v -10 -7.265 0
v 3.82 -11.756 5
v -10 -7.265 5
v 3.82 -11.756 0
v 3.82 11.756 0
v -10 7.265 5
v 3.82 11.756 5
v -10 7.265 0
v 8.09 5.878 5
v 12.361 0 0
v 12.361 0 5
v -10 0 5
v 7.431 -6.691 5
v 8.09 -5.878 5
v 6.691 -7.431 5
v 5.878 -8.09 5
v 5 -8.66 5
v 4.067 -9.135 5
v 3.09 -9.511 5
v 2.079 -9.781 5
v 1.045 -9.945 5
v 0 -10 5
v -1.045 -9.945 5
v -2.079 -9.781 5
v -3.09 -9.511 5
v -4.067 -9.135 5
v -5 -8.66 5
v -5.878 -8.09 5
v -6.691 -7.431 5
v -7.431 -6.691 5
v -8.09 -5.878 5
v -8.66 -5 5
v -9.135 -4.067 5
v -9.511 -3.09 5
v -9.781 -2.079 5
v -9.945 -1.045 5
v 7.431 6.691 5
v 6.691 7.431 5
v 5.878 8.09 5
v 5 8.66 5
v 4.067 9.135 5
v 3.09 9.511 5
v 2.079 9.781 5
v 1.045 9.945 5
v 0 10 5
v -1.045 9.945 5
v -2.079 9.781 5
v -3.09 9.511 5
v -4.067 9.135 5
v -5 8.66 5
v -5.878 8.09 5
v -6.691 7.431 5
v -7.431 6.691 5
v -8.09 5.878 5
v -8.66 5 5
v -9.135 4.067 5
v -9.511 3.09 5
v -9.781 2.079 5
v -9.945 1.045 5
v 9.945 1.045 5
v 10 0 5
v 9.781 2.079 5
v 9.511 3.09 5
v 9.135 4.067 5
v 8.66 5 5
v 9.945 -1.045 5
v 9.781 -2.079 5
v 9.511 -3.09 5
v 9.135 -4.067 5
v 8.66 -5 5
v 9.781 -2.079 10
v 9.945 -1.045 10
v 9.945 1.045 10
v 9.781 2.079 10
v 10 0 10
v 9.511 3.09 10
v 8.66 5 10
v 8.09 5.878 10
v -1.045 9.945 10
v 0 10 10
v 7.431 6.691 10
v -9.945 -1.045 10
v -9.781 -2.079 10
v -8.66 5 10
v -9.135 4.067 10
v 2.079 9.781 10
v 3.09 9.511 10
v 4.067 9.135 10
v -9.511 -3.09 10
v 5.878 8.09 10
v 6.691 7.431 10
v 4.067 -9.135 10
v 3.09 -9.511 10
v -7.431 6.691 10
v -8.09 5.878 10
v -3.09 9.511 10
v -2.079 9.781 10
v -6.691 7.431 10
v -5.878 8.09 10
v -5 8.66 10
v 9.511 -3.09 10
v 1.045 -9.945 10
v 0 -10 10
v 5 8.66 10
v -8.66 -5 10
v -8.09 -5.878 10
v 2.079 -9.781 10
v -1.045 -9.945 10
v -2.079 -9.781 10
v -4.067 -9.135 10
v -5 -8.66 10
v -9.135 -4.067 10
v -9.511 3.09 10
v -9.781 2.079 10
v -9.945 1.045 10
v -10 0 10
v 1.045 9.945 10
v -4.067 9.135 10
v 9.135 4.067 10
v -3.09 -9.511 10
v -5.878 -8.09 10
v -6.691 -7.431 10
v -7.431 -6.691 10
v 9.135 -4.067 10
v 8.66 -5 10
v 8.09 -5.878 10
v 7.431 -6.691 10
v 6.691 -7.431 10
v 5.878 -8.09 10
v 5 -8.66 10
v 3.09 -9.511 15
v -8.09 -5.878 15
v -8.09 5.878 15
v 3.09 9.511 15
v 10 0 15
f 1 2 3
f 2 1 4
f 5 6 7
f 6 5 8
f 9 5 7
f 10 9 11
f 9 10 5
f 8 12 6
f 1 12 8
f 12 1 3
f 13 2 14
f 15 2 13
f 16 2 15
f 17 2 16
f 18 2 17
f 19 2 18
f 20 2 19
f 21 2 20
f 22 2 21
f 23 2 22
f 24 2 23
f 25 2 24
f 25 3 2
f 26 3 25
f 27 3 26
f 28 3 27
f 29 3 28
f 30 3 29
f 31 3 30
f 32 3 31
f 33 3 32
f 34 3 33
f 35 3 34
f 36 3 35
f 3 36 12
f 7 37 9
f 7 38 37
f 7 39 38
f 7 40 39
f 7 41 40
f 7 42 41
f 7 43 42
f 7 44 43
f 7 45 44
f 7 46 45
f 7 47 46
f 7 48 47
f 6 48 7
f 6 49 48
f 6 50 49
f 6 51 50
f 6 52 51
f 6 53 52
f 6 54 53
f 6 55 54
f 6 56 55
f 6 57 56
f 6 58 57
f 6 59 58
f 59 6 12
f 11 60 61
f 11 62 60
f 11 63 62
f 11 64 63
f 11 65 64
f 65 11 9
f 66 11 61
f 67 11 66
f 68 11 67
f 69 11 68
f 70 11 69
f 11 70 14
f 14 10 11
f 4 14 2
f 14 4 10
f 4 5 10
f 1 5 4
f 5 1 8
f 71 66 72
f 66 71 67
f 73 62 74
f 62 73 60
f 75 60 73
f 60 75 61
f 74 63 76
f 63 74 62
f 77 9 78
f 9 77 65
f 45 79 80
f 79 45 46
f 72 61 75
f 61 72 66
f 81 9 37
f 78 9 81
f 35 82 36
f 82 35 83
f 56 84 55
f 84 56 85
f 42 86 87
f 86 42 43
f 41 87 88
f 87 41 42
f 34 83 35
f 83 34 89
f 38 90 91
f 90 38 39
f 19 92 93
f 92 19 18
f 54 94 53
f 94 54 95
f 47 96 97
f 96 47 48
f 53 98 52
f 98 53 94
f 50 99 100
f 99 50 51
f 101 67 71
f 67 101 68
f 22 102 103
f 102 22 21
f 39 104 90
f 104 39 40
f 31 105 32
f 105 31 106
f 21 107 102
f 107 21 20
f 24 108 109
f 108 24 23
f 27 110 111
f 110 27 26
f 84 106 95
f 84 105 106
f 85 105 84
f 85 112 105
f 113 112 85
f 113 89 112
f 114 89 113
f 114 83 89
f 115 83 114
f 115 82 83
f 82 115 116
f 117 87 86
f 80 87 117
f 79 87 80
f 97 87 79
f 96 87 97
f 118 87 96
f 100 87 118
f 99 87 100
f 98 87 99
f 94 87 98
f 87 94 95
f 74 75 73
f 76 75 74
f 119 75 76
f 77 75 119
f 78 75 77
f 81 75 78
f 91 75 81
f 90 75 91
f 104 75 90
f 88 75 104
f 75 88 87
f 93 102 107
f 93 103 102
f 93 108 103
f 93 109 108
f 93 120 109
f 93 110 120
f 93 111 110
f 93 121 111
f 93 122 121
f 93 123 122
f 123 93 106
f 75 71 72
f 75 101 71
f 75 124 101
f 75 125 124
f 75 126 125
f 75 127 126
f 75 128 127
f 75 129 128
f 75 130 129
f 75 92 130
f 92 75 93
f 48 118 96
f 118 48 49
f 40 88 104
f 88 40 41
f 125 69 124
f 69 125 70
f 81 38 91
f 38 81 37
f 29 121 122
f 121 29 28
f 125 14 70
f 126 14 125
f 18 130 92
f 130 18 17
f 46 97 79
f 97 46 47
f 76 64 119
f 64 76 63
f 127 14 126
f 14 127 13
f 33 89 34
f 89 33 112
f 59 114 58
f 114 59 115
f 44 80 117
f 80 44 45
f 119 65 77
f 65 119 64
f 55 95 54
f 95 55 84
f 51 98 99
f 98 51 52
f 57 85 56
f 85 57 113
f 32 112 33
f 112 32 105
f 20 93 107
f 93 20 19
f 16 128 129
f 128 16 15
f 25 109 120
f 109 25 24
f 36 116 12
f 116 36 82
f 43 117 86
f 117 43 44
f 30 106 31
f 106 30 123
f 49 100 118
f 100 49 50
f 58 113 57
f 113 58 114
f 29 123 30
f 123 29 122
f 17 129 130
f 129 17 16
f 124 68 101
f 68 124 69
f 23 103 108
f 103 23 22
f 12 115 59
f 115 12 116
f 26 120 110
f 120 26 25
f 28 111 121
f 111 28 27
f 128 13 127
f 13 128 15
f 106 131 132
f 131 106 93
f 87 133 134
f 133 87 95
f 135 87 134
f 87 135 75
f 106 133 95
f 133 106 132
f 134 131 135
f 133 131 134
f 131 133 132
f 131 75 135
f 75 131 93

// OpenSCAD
/*
Trying out the customizer with a minimal script that
generates a stack of polygons with a circle in the middle.
The top and bottom polygons are the circumscribed and
inscribed respectively. Uses a single parameter (number
of sides) as shown here: 

http://customizer.makerbot.com/docs

// variable description
variable name = default value; // possible values

*/

// Number of Sides
N=5; // [3,4,5,6,7,8,9,10,11,12,13]

color("RoyalBlue") cylinder(r=10/cos(180/N), h=5, $fn=N);
color("DeepSkyBlue") translate([0,0,5]) cylinder(r=10, h=5, $fn=12*N);
color("Aqua") translate([0,0,10]) cylinder(r=10, h=5, $fn=N);
